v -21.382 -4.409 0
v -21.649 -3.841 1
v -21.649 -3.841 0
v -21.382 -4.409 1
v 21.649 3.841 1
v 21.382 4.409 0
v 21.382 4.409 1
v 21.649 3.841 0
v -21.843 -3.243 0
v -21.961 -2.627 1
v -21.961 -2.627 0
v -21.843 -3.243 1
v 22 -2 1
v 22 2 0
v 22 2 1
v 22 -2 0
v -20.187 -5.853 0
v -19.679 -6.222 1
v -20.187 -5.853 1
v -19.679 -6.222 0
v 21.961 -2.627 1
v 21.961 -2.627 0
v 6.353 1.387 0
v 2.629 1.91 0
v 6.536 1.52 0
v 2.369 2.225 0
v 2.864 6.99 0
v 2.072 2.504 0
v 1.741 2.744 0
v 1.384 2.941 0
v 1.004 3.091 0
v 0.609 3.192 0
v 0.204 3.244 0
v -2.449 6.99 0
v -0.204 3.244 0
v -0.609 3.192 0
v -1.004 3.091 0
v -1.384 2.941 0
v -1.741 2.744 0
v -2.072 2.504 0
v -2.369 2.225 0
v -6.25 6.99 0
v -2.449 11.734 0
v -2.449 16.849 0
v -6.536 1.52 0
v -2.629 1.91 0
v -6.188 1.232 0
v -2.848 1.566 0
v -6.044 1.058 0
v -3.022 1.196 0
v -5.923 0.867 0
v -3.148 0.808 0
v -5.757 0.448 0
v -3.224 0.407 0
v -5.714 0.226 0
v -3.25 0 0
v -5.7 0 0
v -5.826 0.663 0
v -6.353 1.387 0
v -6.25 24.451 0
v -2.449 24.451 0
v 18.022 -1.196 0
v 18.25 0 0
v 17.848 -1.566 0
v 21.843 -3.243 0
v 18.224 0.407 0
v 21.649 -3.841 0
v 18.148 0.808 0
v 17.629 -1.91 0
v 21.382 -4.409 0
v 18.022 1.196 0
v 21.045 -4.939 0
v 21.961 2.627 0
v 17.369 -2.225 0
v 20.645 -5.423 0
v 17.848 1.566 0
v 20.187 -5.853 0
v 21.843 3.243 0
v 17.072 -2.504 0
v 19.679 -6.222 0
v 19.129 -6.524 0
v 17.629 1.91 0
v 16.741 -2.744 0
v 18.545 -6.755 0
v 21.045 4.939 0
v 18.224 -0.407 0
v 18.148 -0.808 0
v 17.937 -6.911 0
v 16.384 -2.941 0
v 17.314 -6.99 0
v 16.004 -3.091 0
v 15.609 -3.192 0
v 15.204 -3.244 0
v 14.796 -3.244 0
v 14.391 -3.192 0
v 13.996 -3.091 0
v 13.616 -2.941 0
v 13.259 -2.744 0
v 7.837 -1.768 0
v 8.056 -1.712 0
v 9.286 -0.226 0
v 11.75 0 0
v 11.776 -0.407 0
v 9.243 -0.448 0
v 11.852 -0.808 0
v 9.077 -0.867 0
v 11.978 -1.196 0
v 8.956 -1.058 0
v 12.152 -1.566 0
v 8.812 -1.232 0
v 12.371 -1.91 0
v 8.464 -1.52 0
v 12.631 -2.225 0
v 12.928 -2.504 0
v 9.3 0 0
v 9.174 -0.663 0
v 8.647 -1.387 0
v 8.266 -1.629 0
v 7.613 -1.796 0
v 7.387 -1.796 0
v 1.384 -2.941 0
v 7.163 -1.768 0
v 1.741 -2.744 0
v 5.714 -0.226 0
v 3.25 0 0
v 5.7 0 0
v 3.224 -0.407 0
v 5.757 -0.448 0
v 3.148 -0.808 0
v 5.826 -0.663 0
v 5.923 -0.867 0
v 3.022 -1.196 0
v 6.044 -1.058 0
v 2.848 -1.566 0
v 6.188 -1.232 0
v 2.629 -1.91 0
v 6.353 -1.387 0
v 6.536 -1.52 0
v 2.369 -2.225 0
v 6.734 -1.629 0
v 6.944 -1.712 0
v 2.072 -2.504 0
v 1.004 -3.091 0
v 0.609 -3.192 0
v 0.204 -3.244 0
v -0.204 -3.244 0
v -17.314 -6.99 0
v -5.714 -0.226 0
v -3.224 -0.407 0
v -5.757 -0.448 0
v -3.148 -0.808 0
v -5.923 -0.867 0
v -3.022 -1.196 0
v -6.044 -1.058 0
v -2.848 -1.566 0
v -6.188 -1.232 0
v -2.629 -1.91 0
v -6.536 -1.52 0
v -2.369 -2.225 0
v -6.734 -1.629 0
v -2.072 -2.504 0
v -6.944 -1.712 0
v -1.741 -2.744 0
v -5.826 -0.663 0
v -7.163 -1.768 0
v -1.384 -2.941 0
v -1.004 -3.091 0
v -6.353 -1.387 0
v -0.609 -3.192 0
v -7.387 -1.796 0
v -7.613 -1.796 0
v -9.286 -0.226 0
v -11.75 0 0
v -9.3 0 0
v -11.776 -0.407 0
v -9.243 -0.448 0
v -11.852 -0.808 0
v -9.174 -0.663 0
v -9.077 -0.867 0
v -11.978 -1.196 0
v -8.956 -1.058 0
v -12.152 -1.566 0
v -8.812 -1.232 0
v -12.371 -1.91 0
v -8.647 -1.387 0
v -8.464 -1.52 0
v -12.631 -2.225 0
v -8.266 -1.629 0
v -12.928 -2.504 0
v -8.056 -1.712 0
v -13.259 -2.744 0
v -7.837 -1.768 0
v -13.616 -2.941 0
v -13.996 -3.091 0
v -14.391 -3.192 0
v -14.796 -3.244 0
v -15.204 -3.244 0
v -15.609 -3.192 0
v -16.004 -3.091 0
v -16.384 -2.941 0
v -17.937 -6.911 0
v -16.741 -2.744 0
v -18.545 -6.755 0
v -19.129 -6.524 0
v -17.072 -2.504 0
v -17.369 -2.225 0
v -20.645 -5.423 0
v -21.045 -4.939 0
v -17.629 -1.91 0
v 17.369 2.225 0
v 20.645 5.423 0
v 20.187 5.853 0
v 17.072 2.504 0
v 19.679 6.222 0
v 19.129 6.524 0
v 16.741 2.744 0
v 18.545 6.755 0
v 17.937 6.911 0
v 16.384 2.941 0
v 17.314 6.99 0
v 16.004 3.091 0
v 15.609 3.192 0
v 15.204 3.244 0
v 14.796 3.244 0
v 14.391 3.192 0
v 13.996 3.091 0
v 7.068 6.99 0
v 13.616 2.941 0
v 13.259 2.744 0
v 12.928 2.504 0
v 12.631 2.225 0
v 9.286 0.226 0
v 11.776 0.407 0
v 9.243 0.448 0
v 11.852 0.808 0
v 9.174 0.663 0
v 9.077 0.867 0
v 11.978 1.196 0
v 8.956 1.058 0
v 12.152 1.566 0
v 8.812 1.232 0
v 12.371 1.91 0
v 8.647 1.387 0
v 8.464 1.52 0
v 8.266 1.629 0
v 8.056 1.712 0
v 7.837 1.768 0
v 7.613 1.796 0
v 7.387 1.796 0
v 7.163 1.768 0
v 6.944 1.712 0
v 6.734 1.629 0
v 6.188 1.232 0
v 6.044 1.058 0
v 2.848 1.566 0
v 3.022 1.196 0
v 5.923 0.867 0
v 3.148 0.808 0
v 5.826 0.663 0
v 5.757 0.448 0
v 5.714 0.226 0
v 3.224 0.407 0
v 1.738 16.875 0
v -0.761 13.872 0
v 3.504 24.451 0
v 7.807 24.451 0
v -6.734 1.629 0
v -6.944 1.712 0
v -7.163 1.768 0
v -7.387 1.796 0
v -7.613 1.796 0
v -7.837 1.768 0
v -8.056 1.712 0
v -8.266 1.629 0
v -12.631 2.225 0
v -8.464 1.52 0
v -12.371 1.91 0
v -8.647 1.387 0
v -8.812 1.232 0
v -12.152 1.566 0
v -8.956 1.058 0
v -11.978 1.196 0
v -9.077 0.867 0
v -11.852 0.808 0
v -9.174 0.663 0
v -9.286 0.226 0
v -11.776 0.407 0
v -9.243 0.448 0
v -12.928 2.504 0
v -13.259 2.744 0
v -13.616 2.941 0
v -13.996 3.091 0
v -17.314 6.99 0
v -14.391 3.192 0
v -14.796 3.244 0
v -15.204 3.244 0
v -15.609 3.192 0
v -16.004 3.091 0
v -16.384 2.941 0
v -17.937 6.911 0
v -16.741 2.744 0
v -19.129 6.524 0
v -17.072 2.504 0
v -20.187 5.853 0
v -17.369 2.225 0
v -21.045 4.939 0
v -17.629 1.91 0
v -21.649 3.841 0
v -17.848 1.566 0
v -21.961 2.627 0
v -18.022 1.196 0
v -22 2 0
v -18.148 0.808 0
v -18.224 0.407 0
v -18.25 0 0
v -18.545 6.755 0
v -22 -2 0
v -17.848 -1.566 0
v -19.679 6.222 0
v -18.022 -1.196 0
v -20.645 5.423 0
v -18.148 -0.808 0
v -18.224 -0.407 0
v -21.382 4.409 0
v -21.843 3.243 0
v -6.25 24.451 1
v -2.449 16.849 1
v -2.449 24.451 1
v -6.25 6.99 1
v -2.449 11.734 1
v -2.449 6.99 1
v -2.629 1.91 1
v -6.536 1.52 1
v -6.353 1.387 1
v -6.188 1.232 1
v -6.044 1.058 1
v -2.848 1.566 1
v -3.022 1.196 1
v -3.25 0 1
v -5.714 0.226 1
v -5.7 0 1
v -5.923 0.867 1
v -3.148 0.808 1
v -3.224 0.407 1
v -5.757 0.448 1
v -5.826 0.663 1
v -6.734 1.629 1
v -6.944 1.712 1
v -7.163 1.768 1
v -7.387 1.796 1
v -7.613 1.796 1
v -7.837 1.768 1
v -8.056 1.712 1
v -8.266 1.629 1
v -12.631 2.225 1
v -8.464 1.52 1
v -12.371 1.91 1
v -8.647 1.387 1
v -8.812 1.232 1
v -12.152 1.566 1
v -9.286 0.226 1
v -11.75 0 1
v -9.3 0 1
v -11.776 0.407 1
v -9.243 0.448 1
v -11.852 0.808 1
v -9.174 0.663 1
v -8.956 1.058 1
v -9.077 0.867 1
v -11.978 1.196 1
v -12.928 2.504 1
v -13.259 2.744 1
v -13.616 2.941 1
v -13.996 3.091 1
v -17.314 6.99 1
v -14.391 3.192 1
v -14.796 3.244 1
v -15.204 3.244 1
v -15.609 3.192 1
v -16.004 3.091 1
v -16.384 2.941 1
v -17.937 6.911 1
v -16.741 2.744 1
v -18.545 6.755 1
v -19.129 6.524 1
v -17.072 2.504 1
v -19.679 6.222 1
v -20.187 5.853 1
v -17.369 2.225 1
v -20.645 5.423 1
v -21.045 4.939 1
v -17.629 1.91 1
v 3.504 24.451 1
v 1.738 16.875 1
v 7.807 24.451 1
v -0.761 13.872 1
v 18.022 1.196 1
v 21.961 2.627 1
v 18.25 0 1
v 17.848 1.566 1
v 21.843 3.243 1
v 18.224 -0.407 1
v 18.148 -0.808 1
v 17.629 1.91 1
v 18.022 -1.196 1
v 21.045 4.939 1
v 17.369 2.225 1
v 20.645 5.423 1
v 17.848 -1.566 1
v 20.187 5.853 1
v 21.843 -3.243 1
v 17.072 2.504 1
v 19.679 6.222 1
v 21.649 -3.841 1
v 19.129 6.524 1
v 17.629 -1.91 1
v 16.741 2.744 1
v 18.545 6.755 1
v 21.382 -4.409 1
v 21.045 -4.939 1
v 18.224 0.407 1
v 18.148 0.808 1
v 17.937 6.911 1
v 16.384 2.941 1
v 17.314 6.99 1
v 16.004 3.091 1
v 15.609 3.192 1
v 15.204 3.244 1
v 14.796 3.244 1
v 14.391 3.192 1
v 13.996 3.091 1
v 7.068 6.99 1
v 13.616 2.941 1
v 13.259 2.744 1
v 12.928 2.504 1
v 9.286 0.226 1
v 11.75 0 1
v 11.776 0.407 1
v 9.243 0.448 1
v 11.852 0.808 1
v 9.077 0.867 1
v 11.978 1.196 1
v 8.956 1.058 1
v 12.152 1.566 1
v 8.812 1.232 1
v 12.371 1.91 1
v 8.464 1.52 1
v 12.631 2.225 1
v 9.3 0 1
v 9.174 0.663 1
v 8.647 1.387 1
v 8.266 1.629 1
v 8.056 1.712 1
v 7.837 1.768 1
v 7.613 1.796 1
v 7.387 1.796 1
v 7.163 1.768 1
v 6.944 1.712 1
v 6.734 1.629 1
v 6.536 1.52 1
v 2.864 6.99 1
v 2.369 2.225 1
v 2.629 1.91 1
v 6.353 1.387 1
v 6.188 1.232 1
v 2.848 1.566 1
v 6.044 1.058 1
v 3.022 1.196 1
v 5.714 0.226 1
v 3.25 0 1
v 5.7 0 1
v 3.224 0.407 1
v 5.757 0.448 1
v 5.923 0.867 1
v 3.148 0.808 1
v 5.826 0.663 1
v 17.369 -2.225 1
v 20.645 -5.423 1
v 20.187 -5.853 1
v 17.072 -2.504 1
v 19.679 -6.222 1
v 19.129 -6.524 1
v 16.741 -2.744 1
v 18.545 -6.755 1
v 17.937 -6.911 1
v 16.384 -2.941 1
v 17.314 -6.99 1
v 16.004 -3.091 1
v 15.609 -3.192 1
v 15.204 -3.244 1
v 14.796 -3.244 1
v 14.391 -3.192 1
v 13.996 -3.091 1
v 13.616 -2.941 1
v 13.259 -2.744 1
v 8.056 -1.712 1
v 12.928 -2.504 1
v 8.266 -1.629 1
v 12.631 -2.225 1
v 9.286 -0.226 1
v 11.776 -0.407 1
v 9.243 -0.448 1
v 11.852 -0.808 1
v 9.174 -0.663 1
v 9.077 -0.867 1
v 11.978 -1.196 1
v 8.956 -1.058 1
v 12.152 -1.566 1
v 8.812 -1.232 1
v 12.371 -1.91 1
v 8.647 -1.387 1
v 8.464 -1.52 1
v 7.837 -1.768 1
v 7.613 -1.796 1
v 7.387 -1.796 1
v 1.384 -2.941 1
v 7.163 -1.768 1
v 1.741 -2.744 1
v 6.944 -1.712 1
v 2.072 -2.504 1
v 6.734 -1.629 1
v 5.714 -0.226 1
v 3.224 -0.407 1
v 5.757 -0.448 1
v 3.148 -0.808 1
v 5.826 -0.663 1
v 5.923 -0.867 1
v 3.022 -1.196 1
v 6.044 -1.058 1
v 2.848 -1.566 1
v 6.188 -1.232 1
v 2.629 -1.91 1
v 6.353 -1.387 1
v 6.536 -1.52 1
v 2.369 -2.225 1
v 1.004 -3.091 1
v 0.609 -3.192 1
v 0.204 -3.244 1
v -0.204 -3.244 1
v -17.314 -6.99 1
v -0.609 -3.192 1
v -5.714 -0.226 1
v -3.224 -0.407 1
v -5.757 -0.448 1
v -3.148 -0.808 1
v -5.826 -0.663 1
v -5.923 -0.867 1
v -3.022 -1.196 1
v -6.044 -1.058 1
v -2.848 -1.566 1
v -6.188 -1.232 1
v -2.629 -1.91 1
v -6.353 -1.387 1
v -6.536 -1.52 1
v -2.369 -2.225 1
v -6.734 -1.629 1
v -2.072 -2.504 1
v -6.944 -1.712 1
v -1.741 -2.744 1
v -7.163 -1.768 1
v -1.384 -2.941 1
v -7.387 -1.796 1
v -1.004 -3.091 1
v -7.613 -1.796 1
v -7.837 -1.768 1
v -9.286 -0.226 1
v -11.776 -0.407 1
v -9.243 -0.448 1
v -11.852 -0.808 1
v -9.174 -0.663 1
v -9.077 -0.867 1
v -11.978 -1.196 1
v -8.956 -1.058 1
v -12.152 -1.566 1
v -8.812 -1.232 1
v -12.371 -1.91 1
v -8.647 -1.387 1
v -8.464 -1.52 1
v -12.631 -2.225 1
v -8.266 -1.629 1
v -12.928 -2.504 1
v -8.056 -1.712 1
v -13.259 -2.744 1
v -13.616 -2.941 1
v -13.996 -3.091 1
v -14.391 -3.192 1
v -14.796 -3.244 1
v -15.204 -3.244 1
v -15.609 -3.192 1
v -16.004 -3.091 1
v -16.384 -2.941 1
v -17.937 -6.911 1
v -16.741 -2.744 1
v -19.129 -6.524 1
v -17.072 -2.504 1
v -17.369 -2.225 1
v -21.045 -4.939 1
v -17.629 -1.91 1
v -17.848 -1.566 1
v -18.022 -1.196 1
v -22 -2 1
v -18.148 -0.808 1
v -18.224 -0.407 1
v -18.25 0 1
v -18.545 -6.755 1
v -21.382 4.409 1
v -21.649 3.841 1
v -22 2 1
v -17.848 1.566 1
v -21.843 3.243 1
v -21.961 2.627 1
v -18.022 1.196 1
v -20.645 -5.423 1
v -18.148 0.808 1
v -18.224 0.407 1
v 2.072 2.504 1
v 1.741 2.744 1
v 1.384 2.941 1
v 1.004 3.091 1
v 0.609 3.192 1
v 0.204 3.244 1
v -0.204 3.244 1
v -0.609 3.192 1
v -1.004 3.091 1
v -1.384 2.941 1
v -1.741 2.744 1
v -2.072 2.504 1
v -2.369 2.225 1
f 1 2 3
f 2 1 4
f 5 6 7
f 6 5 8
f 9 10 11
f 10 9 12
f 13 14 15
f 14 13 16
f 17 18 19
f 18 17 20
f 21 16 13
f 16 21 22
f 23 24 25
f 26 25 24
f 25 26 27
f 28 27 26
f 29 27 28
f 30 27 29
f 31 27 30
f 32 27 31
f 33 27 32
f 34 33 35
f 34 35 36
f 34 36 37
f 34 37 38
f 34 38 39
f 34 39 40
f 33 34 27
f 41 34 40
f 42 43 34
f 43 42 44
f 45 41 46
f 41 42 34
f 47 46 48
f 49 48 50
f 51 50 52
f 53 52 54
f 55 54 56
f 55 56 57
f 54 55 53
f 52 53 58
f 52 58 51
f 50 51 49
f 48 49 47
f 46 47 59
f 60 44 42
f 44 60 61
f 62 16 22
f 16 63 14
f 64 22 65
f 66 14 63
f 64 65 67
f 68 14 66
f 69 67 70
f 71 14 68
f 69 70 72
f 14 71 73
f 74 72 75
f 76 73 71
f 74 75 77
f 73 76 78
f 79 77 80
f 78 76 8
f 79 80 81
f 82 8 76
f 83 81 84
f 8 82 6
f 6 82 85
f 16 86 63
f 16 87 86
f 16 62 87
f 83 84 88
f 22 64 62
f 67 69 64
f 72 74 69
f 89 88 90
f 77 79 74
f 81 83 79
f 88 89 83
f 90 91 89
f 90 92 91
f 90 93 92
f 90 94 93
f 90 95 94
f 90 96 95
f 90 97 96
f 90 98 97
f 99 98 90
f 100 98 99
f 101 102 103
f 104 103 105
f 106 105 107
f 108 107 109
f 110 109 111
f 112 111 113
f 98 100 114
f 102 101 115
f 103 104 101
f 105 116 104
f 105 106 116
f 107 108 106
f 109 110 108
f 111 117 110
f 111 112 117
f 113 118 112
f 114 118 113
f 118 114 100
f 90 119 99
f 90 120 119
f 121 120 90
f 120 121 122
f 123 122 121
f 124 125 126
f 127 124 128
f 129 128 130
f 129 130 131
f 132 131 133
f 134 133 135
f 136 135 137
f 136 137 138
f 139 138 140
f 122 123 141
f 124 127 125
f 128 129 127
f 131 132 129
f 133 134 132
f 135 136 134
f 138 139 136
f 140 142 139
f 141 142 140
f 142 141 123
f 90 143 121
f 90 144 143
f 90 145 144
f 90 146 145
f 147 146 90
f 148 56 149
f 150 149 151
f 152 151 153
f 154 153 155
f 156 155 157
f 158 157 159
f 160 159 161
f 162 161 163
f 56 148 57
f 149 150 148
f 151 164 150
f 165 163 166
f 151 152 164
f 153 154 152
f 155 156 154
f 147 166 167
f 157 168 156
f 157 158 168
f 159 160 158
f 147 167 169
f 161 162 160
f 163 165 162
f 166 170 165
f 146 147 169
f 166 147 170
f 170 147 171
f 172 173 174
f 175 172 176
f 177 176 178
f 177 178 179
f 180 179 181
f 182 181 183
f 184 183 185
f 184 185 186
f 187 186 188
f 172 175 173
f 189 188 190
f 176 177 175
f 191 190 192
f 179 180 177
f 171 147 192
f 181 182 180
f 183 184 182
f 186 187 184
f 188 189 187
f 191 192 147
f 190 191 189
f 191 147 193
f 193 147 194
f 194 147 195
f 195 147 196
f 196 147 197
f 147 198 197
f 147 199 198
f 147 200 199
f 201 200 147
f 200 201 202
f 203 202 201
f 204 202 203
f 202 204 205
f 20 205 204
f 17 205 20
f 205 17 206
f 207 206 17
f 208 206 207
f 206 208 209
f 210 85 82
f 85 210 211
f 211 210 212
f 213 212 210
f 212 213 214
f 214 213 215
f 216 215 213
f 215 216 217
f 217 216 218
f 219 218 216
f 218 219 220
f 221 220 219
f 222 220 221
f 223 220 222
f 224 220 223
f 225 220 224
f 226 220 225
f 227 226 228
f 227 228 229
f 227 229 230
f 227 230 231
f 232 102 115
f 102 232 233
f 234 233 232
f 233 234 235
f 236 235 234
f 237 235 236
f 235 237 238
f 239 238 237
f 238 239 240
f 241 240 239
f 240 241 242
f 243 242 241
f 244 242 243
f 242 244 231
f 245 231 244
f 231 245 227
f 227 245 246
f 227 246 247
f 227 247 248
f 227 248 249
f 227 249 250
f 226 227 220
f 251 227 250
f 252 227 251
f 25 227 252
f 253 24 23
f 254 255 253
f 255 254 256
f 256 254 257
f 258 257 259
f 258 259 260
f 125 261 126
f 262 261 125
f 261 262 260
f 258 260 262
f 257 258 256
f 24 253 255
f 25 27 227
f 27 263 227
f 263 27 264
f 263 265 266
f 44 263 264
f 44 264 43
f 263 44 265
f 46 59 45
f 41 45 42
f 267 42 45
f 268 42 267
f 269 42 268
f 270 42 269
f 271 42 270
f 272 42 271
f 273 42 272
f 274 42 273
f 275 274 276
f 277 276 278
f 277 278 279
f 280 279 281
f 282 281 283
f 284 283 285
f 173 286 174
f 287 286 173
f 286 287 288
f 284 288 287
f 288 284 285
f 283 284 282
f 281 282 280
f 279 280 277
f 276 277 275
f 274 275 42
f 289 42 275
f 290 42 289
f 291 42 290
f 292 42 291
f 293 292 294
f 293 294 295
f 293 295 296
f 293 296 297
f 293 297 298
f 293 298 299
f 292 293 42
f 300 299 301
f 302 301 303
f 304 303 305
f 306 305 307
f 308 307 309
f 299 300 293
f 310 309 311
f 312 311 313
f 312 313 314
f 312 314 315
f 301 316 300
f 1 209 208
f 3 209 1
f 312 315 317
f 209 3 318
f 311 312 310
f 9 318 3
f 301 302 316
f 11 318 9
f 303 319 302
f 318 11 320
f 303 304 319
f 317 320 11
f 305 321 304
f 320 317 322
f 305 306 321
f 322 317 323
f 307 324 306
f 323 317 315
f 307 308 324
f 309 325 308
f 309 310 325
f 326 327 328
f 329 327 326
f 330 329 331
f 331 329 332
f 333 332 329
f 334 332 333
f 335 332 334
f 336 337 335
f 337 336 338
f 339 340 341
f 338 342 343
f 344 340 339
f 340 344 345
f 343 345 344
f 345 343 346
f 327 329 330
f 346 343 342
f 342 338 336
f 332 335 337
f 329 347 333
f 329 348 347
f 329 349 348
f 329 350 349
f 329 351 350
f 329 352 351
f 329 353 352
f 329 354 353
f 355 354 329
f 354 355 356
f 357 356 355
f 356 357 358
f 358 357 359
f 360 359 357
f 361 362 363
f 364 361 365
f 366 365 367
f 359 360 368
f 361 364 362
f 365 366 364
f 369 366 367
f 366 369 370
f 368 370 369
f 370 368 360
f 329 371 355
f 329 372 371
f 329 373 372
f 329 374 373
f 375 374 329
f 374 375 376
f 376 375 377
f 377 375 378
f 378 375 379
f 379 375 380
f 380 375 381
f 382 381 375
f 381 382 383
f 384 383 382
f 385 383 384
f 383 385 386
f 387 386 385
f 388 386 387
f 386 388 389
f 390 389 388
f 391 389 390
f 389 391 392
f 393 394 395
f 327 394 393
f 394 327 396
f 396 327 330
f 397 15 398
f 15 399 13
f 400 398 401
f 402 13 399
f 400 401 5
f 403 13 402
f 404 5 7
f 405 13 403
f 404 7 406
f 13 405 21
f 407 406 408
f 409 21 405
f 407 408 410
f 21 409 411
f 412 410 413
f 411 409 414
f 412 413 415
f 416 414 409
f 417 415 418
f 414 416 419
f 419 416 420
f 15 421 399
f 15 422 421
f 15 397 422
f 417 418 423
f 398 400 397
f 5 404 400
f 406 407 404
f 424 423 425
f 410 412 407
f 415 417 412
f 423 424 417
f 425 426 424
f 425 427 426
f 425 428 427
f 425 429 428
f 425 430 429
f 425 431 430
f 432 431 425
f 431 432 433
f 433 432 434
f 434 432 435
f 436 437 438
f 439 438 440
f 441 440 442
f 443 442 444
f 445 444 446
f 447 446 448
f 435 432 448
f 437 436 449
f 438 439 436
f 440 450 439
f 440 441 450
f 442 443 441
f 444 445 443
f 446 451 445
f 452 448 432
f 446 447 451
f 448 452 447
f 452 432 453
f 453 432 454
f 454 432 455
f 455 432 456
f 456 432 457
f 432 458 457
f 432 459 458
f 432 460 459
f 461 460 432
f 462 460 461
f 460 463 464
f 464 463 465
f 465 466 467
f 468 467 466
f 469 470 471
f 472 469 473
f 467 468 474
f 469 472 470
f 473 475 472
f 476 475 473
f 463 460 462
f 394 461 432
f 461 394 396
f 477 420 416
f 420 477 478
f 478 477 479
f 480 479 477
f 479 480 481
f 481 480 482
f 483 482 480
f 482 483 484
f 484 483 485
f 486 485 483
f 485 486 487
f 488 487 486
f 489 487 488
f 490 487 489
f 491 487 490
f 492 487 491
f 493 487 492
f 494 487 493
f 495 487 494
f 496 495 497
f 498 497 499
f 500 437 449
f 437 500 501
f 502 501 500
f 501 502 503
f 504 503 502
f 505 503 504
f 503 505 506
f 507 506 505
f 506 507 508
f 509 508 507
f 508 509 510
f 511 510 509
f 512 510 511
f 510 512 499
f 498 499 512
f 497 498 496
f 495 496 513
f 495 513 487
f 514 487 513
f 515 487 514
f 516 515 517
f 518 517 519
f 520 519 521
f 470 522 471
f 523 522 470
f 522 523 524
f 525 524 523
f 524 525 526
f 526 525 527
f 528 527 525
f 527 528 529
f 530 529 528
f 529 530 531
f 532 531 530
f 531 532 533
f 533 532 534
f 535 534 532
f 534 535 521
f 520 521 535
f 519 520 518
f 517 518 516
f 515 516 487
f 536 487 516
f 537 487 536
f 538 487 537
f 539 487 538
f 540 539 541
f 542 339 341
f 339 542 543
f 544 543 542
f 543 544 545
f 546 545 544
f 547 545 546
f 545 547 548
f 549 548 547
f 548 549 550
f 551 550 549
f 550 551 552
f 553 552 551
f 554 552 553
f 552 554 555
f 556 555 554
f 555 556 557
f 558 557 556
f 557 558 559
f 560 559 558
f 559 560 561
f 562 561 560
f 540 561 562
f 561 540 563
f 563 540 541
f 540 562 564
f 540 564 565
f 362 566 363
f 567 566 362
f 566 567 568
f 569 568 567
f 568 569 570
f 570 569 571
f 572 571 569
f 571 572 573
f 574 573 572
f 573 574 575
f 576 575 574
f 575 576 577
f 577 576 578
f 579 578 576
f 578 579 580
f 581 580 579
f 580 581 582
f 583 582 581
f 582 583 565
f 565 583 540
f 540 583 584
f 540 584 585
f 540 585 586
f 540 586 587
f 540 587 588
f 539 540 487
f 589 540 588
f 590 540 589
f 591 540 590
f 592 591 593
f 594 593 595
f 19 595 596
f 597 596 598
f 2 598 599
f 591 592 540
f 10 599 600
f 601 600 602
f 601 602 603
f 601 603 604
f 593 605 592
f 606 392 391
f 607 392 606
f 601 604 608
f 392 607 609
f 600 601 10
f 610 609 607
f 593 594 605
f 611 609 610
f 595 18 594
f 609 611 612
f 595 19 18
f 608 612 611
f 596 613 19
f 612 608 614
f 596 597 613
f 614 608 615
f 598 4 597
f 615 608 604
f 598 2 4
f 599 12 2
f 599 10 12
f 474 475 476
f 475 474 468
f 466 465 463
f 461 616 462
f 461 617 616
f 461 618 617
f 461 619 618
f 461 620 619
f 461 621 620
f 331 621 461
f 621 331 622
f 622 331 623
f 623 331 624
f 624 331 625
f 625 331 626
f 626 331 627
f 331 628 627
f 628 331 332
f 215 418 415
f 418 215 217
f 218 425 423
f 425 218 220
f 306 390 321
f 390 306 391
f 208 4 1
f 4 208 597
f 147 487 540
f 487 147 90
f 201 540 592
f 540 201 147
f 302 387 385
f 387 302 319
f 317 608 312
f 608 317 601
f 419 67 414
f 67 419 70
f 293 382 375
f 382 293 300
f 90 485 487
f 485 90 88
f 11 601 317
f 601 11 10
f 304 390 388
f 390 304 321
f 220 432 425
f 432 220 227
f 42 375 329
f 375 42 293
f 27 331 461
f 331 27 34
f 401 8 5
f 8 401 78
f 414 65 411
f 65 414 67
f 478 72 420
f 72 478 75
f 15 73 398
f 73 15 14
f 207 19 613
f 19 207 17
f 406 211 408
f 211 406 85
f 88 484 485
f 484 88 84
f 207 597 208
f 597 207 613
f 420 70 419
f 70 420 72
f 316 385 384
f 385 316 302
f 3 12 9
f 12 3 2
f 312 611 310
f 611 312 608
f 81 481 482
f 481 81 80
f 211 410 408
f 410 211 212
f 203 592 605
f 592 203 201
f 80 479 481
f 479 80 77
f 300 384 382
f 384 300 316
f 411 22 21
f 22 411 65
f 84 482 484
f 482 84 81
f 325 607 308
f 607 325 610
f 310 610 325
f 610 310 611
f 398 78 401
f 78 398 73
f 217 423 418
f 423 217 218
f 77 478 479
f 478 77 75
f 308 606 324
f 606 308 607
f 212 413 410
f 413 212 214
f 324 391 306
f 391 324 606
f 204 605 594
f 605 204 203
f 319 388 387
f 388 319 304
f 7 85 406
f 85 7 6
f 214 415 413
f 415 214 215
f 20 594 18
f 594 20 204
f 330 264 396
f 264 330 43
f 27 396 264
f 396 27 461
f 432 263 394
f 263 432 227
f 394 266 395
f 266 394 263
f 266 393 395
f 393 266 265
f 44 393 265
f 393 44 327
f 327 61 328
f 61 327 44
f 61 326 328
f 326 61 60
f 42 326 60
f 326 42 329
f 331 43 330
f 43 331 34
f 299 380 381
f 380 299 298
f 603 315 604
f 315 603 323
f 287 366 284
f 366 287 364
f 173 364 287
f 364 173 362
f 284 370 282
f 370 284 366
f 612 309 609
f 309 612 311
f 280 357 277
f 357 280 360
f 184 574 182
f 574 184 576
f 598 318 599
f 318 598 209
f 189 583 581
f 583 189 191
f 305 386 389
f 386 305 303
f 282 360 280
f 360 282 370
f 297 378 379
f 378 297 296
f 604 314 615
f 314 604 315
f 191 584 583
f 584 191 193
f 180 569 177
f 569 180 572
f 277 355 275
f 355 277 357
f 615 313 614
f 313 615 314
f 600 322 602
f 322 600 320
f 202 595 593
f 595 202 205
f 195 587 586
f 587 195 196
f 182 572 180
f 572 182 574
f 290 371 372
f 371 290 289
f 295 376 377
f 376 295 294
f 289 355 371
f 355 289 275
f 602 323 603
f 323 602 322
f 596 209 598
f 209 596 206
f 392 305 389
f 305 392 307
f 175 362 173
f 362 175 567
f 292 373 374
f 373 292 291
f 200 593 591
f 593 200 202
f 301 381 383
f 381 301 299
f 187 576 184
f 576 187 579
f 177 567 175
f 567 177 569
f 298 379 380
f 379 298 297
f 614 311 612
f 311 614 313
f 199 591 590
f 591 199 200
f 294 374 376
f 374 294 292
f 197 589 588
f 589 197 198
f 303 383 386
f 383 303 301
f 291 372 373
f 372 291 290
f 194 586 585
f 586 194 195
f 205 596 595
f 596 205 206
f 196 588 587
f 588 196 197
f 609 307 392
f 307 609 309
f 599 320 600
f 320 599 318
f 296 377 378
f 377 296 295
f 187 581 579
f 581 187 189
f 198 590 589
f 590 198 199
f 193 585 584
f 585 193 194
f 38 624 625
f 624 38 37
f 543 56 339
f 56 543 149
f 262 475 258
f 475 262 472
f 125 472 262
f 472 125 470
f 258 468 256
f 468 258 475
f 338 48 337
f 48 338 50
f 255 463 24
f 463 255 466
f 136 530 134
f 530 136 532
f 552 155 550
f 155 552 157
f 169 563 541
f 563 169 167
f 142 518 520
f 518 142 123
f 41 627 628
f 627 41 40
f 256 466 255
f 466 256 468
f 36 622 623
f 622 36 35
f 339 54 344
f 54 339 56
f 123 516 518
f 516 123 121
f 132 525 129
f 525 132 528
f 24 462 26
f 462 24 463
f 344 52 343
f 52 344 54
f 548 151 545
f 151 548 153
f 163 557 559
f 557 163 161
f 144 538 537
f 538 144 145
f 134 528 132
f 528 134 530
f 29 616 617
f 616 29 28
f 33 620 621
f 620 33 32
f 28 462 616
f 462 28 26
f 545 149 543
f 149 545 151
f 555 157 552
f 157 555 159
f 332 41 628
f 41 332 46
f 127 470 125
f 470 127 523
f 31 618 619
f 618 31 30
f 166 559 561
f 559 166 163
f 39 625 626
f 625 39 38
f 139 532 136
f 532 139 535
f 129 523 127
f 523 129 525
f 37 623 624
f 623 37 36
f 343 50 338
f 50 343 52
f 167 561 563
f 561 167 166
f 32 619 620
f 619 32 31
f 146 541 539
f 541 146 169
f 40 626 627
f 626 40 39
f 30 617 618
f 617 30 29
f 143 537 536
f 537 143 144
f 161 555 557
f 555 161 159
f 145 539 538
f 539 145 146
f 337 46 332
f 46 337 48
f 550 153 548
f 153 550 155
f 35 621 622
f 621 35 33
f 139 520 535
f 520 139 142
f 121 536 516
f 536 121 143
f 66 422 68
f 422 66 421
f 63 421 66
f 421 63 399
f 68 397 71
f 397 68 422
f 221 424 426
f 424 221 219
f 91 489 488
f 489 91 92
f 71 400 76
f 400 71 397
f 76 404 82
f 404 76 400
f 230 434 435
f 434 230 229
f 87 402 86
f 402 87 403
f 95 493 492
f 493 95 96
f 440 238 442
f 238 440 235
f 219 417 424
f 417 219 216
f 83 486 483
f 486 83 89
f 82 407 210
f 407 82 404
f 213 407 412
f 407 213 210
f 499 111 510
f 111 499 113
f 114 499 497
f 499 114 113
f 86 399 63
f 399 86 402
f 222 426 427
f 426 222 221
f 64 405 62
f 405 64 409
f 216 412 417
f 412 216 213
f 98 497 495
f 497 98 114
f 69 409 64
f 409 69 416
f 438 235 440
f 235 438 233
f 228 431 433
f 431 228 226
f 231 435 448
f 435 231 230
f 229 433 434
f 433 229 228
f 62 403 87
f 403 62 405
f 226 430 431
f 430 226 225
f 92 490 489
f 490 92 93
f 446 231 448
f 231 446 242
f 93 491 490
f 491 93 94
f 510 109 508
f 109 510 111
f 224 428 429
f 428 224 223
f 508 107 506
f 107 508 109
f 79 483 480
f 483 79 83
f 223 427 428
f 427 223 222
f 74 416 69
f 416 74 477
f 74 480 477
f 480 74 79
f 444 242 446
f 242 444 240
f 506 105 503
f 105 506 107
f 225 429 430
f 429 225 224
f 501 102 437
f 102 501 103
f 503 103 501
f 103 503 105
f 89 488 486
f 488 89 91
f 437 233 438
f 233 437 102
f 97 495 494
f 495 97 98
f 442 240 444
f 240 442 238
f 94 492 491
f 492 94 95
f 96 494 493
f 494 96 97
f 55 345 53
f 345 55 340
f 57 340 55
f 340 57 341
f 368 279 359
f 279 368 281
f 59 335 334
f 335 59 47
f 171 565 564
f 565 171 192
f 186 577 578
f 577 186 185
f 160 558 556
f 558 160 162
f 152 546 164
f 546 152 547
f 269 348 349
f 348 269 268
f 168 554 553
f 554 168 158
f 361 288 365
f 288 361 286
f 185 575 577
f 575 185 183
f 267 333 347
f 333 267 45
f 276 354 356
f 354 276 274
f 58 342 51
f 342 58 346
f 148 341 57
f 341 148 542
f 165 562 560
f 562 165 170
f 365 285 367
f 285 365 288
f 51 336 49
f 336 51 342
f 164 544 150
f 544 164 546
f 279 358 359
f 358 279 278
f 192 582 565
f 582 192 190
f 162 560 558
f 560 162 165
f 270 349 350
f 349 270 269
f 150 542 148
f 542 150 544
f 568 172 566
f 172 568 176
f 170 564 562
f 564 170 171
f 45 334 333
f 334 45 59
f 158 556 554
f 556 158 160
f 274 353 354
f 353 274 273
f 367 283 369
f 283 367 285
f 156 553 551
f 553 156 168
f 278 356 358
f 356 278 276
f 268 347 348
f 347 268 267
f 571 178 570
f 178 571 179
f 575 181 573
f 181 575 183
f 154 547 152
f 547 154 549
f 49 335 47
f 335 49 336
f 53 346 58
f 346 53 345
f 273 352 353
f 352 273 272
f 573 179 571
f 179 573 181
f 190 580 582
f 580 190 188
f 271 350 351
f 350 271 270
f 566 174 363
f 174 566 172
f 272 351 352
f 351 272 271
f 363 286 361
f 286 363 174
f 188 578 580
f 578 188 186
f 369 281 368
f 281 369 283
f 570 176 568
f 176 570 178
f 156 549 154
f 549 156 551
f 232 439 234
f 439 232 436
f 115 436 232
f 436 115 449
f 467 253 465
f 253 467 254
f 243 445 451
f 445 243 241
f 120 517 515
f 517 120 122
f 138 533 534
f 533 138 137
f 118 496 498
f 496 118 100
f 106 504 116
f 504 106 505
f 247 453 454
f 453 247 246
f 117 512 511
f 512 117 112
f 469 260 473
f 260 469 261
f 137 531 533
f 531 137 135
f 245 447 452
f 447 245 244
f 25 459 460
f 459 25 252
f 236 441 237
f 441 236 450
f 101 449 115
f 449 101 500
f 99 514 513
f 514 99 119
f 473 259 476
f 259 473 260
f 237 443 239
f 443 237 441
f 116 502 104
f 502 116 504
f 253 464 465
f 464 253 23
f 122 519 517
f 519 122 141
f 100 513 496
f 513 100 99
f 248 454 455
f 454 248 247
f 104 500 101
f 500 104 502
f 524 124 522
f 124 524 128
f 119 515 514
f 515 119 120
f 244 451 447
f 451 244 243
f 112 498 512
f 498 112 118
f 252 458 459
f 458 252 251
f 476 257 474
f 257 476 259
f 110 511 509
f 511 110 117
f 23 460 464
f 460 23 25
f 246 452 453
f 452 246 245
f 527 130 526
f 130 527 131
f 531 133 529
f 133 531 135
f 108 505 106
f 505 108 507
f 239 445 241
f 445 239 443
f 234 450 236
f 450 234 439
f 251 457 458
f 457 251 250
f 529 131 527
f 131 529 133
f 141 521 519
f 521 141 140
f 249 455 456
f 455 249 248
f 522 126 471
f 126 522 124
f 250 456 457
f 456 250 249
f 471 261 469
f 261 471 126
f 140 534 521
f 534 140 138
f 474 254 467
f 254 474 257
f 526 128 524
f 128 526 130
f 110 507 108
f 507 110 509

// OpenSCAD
$fn = 50;


difference() {
	union() {
		hull() {
			translate(v = [-17.0000000000, 2.0000000000, 0]) {
				cylinder(h = 1, r = 5);
			}
			translate(v = [17.0000000000, 2.0000000000, 0]) {
				cylinder(h = 1, r = 5);
			}
			translate(v = [-17.0000000000, -2.0000000000, 0]) {
				cylinder(h = 1, r = 5);
			}
			translate(v = [17.0000000000, -2.0000000000, 0]) {
				cylinder(h = 1, r = 5);
			}
		}
		translate(v = [0, 24, 0]) {
			linear_extrude(height = 1) {
				text(font = "DejaVu Sans Mono:style=Bold", halign = "center", size = 19.0000000000, text = "K", valign = "top");
			}
		}
	}
	union() {
		translate(v = [-15.0000000000, 0.0000000000, 0]) {
			translate(v = [0, 0, -100]) {
				cylinder(h = 200, r = 3.2500000000);
			}
		}
		translate(v = [0, 0, -100]) {
			cylinder(h = 200, r = 3.2500000000);
		}
		translate(v = [15.0000000000, 0.0000000000, 0]) {
			translate(v = [0, 0, -100]) {
				cylinder(h = 200, r = 3.2500000000);
			}
		}
		translate(v = [-15.0000000000, 0.0000000000, 0]) {
			translate(v = [0, 0, -100]) {
				cylinder(h = 200, r = 1.8000000000);
			}
		}
		translate(v = [-7.5000000000, 0.0000000000, 0]) {
			translate(v = [0, 0, -100]) {
				cylinder(h = 200, r = 1.8000000000);
			}
		}
		translate(v = [0, 0, -100]) {
			cylinder(h = 200, r = 1.8000000000);
		}
		translate(v = [7.5000000000, 0.0000000000, 0]) {
			translate(v = [0, 0, -100]) {
				cylinder(h = 200, r = 1.8000000000);
			}
		}
		translate(v = [15.0000000000, 0.0000000000, 0]) {
			translate(v = [0, 0, -100]) {
				cylinder(h = 200, r = 1.8000000000);
			}
		}
	}
}
